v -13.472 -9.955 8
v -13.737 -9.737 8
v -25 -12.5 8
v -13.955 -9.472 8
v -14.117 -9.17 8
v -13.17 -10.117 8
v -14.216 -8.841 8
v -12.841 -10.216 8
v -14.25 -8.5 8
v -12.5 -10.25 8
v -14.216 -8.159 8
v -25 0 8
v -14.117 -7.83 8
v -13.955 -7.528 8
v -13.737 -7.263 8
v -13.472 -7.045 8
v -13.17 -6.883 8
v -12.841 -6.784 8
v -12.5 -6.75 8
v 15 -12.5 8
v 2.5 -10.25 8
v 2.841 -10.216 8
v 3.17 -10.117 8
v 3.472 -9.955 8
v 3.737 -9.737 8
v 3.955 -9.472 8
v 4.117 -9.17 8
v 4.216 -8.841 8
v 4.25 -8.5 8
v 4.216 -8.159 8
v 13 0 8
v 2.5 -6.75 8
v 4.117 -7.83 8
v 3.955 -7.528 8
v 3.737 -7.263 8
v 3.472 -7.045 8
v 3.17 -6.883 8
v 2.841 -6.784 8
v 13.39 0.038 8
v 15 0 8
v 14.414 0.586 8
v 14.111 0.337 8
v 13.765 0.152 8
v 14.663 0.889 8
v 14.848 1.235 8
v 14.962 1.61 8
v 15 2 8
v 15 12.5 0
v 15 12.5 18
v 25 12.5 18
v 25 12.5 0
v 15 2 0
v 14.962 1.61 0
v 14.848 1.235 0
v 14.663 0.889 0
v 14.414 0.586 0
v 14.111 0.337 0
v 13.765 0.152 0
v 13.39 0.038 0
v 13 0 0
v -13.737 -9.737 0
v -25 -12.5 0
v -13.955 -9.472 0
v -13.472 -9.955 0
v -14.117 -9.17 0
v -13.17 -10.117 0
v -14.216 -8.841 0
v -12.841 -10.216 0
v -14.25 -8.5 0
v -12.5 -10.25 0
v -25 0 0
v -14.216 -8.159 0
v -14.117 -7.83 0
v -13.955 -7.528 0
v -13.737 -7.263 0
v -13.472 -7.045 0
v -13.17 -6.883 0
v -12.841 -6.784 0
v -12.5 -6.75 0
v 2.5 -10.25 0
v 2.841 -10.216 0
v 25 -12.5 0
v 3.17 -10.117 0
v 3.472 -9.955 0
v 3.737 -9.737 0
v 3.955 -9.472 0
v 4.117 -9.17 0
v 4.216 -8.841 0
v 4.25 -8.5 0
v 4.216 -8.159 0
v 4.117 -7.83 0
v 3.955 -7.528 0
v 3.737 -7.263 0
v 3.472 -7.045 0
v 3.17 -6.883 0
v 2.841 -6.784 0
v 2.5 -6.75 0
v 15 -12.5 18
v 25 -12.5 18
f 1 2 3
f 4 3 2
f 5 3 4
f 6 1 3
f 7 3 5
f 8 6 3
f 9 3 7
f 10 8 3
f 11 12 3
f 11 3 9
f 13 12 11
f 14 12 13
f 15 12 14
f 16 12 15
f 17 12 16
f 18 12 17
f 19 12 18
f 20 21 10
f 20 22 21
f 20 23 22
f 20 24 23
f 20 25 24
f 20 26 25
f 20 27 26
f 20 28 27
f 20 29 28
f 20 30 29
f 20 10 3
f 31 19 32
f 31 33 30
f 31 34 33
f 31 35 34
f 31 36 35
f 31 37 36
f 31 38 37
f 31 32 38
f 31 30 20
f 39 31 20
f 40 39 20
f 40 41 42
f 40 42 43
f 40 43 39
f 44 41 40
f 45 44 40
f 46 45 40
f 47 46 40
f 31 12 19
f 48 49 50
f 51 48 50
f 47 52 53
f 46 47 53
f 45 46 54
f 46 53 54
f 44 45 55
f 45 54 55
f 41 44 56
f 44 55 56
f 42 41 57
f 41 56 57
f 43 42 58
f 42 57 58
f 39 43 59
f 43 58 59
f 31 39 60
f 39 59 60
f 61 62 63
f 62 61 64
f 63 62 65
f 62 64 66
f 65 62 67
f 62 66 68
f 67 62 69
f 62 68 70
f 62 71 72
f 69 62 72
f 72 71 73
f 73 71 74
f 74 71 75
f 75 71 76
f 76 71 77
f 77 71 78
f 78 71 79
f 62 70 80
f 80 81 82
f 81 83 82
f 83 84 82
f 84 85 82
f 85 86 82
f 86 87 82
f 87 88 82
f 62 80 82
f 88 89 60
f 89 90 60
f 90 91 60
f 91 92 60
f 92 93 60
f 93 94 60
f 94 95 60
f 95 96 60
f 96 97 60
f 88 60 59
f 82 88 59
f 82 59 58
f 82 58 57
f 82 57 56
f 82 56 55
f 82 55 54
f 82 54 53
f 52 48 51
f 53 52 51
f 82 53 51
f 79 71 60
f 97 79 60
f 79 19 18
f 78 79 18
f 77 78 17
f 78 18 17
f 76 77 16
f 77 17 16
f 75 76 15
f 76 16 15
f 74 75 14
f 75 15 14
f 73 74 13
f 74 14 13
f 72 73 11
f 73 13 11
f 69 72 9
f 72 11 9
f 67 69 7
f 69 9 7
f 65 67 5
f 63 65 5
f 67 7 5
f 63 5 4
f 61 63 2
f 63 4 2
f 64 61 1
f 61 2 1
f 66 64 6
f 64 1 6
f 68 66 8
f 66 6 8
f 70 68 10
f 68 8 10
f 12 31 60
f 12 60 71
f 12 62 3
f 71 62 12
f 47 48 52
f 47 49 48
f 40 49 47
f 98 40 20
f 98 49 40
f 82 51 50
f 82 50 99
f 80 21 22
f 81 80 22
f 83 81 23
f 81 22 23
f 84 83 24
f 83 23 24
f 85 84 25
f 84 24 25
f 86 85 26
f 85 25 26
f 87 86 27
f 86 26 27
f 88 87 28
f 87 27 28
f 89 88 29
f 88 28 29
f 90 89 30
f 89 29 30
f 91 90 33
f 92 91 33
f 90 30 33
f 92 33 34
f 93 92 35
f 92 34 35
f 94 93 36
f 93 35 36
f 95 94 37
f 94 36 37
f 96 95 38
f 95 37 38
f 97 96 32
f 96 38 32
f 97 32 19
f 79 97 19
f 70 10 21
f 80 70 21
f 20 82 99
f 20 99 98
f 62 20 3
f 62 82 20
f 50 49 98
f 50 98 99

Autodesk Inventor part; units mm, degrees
ref_plane "YZ Plane" through (0, 0, 0) normal (1, 0, 0) x (0, 1, 0)
ref_plane "XZ Plane" through (0, 0, 0) normal (0, 1, 0) x (-1, 0, 0)
ref_plane "XY Plane" through (0, 0, 0) normal (0, 0, 1) x (1, 0, 0)
sketch "Sketch1" plane through (0, 0, 0) normal (0, 0, 1) x (1, 0, 0)
  line L0 (-25, 12.5) -> (25, 12.5)
  line L1 (25, 12.5) -> (25, -12.5)
  line L2 (25, -12.5) -> (-25, -12.5)
  line L3 (-25, -12.5) -> (-25, 12.5)
  point P0 (0, 0)
  point P1 (0, 12.5)
  point P2 (-25, 0)
  dimension "d0" = 50
  dimension "d1" = 25
extrude "Extrusion1" add sketch "Sketch1" along normal blind 18
sketch "Sketch5" plane through (0, 0, 18) normal (0, 0, 1) x (1, 0, 0)
  line L0 (2.5, 8.5) -> (-12.5, 8.5) construction
  line L1 (2.5, 10.25) -> (-12.5, 10.25)
  line L2 (-12.5, 6.75) -> (2.5, 6.75)
  arc A0 (2.5, 6.75) -> (2.5, 10.25) centre (2.5, 8.5) ccw
  arc A1 (-12.5, 10.25) -> (-12.5, 6.75) centre (-12.5, 8.5) ccw
  line L3 (2.5, -8.5) -> (-12.5, -8.5) construction
  line L4 (2.5, -6.75) -> (-12.5, -6.75)
  line L5 (-12.5, -10.25) -> (2.5, -10.25)
  arc A2 (2.5, -10.25) -> (2.5, -6.75) centre (2.5, -8.5) ccw
  arc A3 (-12.5, -6.75) -> (-12.5, -10.25) centre (-12.5, -8.5) ccw
  line L6 (25, 12.5) -> (-25, 12.5) projected
  line L7 (-25, -12.5) -> (25, -12.5) projected
  line L8 (-25, 12.5) -> (-25, -12.5) projected
  point P0 (0, 0)
  point P1 (-5, 8.5)
  point P2 (-5, -8.5)
  dimension "d29" = 3.5
  dimension "d30" = 4
  dimension "d31" = 4
  dimension "d32" = 20
  dimension "d33" = 15
extrude "Extrusion5" cut sketch "Sketch5" against normal through all contours A2 L5 A3 L4
sketch "Sketch6" plane through (0, 0, 18) normal (0, 0, 1) x (1, 0, 0)
  line L0 (15, 0) -> (-25, 0)
  line L1 (-25, 0) -> (-25, 12.5)
  line L2 (-25, 12.5) -> (15, 12.5)
  line L3 (15, 12.5) -> (15, 0)
  line L4 (25, -12.5) -> (25, 12.5) projected
  line L5 (-25, 12.5) -> (-25, -12.5) projected
  line L6 (25, 12.5) -> (-25, 12.5) projected
  point P0 (0, 0)
  dimension "d36" = 10
extrude "Extrusion6" cut sketch "Sketch6" against normal through all
sketch "Sketch7" plane through (0, 0, 18) normal (0, 0, 1) x (1, 0, 0)
  line L0 (15, -12.5) -> (-25, -12.5)
  line L1 (-25, -12.5) -> (-25, 0)
  line L2 (-25, 0) -> (15, 0)
  line L3 (15, 0) -> (15, -12.5)
  line L4 (15, 12.5) -> (15, 0) projected
  line L5 (-25, -12.5) -> (25, -12.5) projected
  line L6 (-25, 0) -> (-25, -12.5) projected
  line L7 (15, 0) -> (-25, 0) projected
  point P0 (0, 0)
  point P1 (15, 2)
  point P2 (13, 0)
extrude "Extrusion7" cut sketch "Sketch7" against normal blind 10
fillet "Fillet2" radius 2 1 edges at (15, 0, 4)
properties part number "0005-10-025 Activator senzor Y"
